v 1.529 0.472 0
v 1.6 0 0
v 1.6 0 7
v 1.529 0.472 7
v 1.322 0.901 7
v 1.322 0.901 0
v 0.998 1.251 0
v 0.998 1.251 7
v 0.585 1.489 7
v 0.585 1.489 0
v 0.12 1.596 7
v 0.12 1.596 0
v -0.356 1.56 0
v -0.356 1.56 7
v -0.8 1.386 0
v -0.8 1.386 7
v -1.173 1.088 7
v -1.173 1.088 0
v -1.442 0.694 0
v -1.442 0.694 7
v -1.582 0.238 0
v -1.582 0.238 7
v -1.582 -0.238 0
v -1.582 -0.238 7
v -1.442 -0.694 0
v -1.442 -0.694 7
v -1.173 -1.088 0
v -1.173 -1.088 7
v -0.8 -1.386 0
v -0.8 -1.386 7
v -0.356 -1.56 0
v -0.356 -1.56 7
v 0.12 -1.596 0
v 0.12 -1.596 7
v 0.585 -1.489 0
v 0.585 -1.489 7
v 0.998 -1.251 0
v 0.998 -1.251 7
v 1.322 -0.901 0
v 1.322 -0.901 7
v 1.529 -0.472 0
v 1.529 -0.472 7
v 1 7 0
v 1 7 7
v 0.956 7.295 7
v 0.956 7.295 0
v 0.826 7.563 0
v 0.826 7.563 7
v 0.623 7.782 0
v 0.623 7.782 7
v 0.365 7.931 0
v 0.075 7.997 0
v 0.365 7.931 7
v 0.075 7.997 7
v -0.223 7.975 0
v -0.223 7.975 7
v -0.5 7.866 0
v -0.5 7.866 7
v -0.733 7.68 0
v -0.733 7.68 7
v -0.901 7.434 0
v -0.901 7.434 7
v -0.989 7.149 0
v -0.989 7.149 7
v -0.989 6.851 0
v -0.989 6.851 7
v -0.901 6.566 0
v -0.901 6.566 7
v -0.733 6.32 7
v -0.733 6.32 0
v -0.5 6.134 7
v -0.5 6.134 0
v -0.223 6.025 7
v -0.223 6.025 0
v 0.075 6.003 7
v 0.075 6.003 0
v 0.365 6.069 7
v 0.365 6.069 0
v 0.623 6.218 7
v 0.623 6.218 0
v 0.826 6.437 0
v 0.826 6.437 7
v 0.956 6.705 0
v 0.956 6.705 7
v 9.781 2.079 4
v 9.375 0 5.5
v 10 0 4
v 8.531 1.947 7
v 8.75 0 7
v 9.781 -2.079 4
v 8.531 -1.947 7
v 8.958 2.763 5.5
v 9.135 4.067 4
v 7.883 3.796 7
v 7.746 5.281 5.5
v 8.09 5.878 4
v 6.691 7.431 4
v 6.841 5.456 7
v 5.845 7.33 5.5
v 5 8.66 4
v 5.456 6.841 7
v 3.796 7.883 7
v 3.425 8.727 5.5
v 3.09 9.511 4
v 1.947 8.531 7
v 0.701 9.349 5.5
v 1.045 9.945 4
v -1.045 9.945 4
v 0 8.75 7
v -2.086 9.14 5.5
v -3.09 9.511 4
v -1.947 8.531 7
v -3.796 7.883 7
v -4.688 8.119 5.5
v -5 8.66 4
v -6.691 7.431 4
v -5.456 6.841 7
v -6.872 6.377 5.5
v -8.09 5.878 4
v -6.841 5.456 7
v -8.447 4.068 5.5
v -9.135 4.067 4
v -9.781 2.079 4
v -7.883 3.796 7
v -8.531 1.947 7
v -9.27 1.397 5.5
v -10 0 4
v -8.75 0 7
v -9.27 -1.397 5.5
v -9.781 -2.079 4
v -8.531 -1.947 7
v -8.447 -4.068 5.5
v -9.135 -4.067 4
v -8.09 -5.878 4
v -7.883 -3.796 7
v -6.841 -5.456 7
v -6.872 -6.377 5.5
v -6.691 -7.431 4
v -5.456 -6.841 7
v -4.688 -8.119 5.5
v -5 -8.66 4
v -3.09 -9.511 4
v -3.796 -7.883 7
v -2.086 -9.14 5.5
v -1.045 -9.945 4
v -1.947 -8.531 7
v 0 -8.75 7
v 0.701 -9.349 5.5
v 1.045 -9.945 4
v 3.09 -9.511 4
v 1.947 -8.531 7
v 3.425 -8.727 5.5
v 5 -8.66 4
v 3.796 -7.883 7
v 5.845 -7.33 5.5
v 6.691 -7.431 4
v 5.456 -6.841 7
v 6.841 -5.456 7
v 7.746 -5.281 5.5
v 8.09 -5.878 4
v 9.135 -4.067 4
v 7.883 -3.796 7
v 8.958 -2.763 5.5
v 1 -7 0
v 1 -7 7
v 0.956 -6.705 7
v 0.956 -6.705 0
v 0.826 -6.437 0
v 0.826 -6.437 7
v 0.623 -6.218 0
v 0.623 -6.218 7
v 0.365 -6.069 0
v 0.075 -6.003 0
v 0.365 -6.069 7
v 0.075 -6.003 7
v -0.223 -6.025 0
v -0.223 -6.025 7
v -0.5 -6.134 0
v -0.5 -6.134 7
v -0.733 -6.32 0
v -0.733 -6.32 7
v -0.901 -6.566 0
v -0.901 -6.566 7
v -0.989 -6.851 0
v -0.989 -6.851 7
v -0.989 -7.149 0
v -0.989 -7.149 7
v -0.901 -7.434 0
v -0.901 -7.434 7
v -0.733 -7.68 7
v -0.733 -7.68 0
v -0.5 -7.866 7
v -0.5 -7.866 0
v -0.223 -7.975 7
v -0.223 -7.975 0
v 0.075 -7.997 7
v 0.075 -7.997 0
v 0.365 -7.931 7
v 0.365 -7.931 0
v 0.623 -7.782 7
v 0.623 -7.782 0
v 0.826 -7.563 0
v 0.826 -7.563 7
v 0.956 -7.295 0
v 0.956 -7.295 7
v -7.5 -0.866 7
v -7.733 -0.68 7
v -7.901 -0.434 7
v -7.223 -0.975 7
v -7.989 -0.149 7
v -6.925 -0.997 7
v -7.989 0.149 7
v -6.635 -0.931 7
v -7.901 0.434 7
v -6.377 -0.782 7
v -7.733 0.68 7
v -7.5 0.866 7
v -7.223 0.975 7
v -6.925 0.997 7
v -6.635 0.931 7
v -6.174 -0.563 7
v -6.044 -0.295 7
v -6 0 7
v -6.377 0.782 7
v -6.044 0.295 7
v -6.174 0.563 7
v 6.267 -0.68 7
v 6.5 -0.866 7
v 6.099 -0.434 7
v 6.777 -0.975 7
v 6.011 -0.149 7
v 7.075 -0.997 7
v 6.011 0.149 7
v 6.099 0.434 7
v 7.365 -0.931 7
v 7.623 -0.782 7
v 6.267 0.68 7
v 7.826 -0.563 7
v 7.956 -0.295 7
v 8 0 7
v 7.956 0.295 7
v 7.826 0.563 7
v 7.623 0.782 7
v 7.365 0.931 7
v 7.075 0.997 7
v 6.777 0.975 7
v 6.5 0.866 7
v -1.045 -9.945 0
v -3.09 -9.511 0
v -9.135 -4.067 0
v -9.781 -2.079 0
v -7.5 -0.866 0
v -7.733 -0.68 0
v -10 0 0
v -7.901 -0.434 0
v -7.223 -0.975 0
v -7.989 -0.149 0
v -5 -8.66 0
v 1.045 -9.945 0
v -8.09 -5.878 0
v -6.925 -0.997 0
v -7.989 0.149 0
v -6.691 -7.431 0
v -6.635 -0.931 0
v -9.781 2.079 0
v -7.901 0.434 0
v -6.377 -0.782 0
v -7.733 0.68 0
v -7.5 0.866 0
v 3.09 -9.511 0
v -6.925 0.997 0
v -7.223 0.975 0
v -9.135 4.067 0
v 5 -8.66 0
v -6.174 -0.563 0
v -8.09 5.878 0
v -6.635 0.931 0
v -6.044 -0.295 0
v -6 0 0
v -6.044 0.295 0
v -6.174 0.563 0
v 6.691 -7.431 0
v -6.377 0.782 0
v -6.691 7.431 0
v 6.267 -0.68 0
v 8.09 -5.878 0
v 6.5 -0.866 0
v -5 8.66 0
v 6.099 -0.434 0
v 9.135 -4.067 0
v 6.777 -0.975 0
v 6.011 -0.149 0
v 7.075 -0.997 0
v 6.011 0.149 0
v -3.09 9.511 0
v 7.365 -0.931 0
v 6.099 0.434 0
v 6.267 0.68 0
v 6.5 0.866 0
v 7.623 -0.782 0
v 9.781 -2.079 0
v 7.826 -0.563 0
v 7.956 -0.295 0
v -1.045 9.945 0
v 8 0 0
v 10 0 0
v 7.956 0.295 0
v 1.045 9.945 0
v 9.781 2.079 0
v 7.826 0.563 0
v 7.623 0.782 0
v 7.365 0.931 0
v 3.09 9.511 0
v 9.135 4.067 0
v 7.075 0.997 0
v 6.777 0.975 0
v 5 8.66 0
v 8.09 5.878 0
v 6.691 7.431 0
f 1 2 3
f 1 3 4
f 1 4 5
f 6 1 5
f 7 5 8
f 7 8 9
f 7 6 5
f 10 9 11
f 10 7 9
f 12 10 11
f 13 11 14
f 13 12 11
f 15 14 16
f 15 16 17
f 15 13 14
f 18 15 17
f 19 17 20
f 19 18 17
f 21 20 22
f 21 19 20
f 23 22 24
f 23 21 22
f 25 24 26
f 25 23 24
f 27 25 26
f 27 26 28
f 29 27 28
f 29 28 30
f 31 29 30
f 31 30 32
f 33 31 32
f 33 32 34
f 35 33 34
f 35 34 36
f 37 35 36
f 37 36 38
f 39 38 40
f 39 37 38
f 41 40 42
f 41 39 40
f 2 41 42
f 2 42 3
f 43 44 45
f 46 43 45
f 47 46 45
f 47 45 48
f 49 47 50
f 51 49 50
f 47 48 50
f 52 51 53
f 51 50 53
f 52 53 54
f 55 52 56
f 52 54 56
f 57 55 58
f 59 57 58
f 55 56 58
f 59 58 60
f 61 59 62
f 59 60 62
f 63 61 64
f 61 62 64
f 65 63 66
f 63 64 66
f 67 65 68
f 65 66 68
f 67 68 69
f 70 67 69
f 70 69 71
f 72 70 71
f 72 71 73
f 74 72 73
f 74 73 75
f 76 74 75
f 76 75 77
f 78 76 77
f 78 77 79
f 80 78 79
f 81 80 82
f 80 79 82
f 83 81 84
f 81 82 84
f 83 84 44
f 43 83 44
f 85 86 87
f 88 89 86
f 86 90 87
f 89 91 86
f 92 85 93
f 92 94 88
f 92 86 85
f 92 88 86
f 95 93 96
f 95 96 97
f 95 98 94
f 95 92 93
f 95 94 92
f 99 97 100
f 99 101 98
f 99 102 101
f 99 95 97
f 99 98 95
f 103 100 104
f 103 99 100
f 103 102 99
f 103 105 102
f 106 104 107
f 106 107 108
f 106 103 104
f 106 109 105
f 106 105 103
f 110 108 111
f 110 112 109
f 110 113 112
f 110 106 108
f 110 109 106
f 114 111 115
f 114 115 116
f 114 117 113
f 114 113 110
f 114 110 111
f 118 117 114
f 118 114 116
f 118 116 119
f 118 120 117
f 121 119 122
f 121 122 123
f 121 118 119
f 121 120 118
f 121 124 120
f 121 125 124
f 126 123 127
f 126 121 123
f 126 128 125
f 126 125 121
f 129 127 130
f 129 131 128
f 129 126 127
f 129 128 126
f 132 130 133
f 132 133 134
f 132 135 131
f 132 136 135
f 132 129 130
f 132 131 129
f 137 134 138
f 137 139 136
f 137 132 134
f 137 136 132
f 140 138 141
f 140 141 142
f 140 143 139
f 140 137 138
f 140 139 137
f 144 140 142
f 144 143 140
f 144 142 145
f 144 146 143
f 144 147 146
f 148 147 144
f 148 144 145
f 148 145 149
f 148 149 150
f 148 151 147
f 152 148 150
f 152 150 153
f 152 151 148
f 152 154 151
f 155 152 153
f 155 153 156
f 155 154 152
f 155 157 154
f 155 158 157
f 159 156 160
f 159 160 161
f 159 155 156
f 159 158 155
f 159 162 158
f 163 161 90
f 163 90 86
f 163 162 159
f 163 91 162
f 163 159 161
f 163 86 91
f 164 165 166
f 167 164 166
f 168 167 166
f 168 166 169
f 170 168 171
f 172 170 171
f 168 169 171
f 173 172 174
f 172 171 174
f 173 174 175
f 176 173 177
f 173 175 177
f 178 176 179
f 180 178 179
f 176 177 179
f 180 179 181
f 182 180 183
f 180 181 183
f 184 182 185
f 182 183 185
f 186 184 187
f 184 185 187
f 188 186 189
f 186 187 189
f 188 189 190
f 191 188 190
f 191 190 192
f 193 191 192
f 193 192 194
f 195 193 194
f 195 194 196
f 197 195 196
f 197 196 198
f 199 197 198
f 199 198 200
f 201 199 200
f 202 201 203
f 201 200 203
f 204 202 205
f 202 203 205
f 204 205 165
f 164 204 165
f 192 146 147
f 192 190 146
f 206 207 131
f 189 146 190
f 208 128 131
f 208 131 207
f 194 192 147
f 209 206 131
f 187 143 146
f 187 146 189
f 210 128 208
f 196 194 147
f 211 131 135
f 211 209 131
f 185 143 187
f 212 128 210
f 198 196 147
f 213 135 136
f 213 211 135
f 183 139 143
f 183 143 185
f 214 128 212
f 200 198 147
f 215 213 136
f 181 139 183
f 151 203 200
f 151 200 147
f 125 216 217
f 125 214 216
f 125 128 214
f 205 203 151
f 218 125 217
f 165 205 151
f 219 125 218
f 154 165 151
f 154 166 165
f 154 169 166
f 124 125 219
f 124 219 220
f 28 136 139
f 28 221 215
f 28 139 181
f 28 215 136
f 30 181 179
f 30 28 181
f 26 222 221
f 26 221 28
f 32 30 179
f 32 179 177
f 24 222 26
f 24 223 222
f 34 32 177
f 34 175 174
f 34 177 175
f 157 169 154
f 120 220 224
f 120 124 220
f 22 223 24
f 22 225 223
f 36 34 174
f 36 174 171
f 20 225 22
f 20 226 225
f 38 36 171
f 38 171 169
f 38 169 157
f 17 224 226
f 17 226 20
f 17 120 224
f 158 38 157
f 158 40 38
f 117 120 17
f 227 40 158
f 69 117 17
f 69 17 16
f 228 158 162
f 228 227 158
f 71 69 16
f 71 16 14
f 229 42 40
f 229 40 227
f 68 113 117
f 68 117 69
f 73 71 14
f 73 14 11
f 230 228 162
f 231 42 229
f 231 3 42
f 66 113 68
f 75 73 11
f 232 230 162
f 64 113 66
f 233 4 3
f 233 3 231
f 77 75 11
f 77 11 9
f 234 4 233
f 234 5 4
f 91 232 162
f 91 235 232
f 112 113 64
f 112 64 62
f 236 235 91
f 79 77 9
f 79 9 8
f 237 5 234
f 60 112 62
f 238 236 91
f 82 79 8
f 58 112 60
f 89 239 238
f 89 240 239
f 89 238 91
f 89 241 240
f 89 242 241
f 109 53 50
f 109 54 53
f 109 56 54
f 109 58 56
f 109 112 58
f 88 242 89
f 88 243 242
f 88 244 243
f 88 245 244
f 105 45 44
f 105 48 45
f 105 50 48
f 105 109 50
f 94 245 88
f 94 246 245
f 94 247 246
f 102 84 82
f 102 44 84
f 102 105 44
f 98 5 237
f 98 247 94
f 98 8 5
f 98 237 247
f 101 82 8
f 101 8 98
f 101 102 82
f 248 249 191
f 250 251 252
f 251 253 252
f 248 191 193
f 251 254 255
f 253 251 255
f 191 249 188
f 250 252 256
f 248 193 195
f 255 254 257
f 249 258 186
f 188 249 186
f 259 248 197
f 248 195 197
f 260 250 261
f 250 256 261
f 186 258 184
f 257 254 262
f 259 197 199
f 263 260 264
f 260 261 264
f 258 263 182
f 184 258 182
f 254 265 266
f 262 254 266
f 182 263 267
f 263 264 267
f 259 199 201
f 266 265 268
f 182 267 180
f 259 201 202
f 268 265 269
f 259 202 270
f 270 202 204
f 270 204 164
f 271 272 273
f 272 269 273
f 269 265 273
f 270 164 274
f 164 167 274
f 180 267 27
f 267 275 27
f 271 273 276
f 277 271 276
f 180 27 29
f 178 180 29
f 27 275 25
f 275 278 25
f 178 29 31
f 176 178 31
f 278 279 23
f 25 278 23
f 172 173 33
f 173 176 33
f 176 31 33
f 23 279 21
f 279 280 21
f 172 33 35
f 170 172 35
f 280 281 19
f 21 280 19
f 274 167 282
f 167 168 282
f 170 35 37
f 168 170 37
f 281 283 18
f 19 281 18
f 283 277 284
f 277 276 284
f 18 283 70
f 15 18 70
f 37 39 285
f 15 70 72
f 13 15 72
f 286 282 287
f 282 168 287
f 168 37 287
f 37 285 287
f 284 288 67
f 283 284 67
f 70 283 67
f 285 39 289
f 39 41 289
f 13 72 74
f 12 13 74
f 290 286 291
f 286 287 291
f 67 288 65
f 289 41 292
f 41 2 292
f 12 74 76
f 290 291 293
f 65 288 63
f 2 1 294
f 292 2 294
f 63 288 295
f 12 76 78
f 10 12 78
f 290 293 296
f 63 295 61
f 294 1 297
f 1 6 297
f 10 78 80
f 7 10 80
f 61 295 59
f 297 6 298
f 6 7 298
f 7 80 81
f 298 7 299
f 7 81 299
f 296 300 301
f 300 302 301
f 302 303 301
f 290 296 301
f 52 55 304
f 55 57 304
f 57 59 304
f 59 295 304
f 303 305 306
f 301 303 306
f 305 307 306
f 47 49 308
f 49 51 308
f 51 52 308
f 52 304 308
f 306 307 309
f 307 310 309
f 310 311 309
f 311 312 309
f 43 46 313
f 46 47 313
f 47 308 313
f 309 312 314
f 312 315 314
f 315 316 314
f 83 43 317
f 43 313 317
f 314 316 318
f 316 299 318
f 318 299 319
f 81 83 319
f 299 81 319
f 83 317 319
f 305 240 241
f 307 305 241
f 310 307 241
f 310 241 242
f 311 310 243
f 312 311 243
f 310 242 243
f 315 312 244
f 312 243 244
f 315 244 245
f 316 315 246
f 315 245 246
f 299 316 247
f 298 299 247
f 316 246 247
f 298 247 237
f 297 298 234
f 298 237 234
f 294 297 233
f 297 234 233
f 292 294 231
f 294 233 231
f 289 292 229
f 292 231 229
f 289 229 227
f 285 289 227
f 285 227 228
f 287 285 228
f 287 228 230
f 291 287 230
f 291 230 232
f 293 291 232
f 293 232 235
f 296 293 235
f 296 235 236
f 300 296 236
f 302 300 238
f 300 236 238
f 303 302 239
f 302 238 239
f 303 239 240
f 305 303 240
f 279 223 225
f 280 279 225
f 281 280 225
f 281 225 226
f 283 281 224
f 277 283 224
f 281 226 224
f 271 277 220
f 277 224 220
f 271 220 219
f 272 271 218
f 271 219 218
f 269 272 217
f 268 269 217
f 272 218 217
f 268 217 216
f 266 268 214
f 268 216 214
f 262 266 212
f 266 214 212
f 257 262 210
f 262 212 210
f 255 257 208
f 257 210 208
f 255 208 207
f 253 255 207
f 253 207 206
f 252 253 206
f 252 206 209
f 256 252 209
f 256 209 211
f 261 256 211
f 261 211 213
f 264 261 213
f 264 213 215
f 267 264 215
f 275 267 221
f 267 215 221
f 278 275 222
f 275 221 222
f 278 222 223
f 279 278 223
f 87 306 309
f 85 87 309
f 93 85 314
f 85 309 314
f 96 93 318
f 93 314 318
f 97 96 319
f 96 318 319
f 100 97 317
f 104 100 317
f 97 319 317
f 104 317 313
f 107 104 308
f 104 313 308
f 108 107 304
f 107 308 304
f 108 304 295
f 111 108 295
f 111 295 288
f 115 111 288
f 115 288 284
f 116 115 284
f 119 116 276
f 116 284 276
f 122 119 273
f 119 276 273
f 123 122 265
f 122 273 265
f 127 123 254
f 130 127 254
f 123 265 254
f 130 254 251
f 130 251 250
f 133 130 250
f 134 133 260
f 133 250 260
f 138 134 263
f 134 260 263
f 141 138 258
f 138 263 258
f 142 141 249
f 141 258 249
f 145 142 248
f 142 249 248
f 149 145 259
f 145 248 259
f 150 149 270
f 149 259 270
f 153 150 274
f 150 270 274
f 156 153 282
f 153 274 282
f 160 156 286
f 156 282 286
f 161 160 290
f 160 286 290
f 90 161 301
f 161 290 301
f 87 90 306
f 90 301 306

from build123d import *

# Parameters (mm, degrees)
SKETCH1_R           = 10
SKETCH1_R_2         = 1.6
BOSS_EXTRUDE1_DEPTH = 7
SKETCH2_R           = 1
CUT_EXTRUDE1_DEPTH  = 7
CHAMFER2_SIZE       = 3
CHAMFER2_SIZE2      = 1.25


with BuildPart() as part:
    # Sketch1 → Boss-Extrude1 (new body)
    with BuildSketch(Plane.XY):
        Circle(SKETCH1_R)
        Circle(SKETCH1_R_2, mode=Mode.SUBTRACT)
    extrude(amount=BOSS_EXTRUDE1_DEPTH)

    # Sketch2 → Cut-Extrude1 (cut)
    with BuildSketch(Plane.XY.offset(7)):
        with Locations((7, 0)):
            Circle(SKETCH2_R)
        with Locations((0, -7)):
            Circle(SKETCH2_R)
        with Locations((-7, 0)):
            Circle(SKETCH2_R)
        with Locations((0, 7)):
            Circle(SKETCH2_R)
    extrude(amount=-CUT_EXTRUDE1_DEPTH, mode=Mode.SUBTRACT)

    # Chamfer2
    chamfer2_edges = [part.edges().sort_by_distance(p)[0] for p in [
        (-10, 0, 7),
    ]]
    chamfer2_side = [part.faces().sort_by_distance(p)[0] for p in [
        (-10, 0, 3.5),
    ]]
    chamfer(chamfer2_edges, length=CHAMFER2_SIZE, length2=CHAMFER2_SIZE2, reference=chamfer2_side[0])


solid = part.part
